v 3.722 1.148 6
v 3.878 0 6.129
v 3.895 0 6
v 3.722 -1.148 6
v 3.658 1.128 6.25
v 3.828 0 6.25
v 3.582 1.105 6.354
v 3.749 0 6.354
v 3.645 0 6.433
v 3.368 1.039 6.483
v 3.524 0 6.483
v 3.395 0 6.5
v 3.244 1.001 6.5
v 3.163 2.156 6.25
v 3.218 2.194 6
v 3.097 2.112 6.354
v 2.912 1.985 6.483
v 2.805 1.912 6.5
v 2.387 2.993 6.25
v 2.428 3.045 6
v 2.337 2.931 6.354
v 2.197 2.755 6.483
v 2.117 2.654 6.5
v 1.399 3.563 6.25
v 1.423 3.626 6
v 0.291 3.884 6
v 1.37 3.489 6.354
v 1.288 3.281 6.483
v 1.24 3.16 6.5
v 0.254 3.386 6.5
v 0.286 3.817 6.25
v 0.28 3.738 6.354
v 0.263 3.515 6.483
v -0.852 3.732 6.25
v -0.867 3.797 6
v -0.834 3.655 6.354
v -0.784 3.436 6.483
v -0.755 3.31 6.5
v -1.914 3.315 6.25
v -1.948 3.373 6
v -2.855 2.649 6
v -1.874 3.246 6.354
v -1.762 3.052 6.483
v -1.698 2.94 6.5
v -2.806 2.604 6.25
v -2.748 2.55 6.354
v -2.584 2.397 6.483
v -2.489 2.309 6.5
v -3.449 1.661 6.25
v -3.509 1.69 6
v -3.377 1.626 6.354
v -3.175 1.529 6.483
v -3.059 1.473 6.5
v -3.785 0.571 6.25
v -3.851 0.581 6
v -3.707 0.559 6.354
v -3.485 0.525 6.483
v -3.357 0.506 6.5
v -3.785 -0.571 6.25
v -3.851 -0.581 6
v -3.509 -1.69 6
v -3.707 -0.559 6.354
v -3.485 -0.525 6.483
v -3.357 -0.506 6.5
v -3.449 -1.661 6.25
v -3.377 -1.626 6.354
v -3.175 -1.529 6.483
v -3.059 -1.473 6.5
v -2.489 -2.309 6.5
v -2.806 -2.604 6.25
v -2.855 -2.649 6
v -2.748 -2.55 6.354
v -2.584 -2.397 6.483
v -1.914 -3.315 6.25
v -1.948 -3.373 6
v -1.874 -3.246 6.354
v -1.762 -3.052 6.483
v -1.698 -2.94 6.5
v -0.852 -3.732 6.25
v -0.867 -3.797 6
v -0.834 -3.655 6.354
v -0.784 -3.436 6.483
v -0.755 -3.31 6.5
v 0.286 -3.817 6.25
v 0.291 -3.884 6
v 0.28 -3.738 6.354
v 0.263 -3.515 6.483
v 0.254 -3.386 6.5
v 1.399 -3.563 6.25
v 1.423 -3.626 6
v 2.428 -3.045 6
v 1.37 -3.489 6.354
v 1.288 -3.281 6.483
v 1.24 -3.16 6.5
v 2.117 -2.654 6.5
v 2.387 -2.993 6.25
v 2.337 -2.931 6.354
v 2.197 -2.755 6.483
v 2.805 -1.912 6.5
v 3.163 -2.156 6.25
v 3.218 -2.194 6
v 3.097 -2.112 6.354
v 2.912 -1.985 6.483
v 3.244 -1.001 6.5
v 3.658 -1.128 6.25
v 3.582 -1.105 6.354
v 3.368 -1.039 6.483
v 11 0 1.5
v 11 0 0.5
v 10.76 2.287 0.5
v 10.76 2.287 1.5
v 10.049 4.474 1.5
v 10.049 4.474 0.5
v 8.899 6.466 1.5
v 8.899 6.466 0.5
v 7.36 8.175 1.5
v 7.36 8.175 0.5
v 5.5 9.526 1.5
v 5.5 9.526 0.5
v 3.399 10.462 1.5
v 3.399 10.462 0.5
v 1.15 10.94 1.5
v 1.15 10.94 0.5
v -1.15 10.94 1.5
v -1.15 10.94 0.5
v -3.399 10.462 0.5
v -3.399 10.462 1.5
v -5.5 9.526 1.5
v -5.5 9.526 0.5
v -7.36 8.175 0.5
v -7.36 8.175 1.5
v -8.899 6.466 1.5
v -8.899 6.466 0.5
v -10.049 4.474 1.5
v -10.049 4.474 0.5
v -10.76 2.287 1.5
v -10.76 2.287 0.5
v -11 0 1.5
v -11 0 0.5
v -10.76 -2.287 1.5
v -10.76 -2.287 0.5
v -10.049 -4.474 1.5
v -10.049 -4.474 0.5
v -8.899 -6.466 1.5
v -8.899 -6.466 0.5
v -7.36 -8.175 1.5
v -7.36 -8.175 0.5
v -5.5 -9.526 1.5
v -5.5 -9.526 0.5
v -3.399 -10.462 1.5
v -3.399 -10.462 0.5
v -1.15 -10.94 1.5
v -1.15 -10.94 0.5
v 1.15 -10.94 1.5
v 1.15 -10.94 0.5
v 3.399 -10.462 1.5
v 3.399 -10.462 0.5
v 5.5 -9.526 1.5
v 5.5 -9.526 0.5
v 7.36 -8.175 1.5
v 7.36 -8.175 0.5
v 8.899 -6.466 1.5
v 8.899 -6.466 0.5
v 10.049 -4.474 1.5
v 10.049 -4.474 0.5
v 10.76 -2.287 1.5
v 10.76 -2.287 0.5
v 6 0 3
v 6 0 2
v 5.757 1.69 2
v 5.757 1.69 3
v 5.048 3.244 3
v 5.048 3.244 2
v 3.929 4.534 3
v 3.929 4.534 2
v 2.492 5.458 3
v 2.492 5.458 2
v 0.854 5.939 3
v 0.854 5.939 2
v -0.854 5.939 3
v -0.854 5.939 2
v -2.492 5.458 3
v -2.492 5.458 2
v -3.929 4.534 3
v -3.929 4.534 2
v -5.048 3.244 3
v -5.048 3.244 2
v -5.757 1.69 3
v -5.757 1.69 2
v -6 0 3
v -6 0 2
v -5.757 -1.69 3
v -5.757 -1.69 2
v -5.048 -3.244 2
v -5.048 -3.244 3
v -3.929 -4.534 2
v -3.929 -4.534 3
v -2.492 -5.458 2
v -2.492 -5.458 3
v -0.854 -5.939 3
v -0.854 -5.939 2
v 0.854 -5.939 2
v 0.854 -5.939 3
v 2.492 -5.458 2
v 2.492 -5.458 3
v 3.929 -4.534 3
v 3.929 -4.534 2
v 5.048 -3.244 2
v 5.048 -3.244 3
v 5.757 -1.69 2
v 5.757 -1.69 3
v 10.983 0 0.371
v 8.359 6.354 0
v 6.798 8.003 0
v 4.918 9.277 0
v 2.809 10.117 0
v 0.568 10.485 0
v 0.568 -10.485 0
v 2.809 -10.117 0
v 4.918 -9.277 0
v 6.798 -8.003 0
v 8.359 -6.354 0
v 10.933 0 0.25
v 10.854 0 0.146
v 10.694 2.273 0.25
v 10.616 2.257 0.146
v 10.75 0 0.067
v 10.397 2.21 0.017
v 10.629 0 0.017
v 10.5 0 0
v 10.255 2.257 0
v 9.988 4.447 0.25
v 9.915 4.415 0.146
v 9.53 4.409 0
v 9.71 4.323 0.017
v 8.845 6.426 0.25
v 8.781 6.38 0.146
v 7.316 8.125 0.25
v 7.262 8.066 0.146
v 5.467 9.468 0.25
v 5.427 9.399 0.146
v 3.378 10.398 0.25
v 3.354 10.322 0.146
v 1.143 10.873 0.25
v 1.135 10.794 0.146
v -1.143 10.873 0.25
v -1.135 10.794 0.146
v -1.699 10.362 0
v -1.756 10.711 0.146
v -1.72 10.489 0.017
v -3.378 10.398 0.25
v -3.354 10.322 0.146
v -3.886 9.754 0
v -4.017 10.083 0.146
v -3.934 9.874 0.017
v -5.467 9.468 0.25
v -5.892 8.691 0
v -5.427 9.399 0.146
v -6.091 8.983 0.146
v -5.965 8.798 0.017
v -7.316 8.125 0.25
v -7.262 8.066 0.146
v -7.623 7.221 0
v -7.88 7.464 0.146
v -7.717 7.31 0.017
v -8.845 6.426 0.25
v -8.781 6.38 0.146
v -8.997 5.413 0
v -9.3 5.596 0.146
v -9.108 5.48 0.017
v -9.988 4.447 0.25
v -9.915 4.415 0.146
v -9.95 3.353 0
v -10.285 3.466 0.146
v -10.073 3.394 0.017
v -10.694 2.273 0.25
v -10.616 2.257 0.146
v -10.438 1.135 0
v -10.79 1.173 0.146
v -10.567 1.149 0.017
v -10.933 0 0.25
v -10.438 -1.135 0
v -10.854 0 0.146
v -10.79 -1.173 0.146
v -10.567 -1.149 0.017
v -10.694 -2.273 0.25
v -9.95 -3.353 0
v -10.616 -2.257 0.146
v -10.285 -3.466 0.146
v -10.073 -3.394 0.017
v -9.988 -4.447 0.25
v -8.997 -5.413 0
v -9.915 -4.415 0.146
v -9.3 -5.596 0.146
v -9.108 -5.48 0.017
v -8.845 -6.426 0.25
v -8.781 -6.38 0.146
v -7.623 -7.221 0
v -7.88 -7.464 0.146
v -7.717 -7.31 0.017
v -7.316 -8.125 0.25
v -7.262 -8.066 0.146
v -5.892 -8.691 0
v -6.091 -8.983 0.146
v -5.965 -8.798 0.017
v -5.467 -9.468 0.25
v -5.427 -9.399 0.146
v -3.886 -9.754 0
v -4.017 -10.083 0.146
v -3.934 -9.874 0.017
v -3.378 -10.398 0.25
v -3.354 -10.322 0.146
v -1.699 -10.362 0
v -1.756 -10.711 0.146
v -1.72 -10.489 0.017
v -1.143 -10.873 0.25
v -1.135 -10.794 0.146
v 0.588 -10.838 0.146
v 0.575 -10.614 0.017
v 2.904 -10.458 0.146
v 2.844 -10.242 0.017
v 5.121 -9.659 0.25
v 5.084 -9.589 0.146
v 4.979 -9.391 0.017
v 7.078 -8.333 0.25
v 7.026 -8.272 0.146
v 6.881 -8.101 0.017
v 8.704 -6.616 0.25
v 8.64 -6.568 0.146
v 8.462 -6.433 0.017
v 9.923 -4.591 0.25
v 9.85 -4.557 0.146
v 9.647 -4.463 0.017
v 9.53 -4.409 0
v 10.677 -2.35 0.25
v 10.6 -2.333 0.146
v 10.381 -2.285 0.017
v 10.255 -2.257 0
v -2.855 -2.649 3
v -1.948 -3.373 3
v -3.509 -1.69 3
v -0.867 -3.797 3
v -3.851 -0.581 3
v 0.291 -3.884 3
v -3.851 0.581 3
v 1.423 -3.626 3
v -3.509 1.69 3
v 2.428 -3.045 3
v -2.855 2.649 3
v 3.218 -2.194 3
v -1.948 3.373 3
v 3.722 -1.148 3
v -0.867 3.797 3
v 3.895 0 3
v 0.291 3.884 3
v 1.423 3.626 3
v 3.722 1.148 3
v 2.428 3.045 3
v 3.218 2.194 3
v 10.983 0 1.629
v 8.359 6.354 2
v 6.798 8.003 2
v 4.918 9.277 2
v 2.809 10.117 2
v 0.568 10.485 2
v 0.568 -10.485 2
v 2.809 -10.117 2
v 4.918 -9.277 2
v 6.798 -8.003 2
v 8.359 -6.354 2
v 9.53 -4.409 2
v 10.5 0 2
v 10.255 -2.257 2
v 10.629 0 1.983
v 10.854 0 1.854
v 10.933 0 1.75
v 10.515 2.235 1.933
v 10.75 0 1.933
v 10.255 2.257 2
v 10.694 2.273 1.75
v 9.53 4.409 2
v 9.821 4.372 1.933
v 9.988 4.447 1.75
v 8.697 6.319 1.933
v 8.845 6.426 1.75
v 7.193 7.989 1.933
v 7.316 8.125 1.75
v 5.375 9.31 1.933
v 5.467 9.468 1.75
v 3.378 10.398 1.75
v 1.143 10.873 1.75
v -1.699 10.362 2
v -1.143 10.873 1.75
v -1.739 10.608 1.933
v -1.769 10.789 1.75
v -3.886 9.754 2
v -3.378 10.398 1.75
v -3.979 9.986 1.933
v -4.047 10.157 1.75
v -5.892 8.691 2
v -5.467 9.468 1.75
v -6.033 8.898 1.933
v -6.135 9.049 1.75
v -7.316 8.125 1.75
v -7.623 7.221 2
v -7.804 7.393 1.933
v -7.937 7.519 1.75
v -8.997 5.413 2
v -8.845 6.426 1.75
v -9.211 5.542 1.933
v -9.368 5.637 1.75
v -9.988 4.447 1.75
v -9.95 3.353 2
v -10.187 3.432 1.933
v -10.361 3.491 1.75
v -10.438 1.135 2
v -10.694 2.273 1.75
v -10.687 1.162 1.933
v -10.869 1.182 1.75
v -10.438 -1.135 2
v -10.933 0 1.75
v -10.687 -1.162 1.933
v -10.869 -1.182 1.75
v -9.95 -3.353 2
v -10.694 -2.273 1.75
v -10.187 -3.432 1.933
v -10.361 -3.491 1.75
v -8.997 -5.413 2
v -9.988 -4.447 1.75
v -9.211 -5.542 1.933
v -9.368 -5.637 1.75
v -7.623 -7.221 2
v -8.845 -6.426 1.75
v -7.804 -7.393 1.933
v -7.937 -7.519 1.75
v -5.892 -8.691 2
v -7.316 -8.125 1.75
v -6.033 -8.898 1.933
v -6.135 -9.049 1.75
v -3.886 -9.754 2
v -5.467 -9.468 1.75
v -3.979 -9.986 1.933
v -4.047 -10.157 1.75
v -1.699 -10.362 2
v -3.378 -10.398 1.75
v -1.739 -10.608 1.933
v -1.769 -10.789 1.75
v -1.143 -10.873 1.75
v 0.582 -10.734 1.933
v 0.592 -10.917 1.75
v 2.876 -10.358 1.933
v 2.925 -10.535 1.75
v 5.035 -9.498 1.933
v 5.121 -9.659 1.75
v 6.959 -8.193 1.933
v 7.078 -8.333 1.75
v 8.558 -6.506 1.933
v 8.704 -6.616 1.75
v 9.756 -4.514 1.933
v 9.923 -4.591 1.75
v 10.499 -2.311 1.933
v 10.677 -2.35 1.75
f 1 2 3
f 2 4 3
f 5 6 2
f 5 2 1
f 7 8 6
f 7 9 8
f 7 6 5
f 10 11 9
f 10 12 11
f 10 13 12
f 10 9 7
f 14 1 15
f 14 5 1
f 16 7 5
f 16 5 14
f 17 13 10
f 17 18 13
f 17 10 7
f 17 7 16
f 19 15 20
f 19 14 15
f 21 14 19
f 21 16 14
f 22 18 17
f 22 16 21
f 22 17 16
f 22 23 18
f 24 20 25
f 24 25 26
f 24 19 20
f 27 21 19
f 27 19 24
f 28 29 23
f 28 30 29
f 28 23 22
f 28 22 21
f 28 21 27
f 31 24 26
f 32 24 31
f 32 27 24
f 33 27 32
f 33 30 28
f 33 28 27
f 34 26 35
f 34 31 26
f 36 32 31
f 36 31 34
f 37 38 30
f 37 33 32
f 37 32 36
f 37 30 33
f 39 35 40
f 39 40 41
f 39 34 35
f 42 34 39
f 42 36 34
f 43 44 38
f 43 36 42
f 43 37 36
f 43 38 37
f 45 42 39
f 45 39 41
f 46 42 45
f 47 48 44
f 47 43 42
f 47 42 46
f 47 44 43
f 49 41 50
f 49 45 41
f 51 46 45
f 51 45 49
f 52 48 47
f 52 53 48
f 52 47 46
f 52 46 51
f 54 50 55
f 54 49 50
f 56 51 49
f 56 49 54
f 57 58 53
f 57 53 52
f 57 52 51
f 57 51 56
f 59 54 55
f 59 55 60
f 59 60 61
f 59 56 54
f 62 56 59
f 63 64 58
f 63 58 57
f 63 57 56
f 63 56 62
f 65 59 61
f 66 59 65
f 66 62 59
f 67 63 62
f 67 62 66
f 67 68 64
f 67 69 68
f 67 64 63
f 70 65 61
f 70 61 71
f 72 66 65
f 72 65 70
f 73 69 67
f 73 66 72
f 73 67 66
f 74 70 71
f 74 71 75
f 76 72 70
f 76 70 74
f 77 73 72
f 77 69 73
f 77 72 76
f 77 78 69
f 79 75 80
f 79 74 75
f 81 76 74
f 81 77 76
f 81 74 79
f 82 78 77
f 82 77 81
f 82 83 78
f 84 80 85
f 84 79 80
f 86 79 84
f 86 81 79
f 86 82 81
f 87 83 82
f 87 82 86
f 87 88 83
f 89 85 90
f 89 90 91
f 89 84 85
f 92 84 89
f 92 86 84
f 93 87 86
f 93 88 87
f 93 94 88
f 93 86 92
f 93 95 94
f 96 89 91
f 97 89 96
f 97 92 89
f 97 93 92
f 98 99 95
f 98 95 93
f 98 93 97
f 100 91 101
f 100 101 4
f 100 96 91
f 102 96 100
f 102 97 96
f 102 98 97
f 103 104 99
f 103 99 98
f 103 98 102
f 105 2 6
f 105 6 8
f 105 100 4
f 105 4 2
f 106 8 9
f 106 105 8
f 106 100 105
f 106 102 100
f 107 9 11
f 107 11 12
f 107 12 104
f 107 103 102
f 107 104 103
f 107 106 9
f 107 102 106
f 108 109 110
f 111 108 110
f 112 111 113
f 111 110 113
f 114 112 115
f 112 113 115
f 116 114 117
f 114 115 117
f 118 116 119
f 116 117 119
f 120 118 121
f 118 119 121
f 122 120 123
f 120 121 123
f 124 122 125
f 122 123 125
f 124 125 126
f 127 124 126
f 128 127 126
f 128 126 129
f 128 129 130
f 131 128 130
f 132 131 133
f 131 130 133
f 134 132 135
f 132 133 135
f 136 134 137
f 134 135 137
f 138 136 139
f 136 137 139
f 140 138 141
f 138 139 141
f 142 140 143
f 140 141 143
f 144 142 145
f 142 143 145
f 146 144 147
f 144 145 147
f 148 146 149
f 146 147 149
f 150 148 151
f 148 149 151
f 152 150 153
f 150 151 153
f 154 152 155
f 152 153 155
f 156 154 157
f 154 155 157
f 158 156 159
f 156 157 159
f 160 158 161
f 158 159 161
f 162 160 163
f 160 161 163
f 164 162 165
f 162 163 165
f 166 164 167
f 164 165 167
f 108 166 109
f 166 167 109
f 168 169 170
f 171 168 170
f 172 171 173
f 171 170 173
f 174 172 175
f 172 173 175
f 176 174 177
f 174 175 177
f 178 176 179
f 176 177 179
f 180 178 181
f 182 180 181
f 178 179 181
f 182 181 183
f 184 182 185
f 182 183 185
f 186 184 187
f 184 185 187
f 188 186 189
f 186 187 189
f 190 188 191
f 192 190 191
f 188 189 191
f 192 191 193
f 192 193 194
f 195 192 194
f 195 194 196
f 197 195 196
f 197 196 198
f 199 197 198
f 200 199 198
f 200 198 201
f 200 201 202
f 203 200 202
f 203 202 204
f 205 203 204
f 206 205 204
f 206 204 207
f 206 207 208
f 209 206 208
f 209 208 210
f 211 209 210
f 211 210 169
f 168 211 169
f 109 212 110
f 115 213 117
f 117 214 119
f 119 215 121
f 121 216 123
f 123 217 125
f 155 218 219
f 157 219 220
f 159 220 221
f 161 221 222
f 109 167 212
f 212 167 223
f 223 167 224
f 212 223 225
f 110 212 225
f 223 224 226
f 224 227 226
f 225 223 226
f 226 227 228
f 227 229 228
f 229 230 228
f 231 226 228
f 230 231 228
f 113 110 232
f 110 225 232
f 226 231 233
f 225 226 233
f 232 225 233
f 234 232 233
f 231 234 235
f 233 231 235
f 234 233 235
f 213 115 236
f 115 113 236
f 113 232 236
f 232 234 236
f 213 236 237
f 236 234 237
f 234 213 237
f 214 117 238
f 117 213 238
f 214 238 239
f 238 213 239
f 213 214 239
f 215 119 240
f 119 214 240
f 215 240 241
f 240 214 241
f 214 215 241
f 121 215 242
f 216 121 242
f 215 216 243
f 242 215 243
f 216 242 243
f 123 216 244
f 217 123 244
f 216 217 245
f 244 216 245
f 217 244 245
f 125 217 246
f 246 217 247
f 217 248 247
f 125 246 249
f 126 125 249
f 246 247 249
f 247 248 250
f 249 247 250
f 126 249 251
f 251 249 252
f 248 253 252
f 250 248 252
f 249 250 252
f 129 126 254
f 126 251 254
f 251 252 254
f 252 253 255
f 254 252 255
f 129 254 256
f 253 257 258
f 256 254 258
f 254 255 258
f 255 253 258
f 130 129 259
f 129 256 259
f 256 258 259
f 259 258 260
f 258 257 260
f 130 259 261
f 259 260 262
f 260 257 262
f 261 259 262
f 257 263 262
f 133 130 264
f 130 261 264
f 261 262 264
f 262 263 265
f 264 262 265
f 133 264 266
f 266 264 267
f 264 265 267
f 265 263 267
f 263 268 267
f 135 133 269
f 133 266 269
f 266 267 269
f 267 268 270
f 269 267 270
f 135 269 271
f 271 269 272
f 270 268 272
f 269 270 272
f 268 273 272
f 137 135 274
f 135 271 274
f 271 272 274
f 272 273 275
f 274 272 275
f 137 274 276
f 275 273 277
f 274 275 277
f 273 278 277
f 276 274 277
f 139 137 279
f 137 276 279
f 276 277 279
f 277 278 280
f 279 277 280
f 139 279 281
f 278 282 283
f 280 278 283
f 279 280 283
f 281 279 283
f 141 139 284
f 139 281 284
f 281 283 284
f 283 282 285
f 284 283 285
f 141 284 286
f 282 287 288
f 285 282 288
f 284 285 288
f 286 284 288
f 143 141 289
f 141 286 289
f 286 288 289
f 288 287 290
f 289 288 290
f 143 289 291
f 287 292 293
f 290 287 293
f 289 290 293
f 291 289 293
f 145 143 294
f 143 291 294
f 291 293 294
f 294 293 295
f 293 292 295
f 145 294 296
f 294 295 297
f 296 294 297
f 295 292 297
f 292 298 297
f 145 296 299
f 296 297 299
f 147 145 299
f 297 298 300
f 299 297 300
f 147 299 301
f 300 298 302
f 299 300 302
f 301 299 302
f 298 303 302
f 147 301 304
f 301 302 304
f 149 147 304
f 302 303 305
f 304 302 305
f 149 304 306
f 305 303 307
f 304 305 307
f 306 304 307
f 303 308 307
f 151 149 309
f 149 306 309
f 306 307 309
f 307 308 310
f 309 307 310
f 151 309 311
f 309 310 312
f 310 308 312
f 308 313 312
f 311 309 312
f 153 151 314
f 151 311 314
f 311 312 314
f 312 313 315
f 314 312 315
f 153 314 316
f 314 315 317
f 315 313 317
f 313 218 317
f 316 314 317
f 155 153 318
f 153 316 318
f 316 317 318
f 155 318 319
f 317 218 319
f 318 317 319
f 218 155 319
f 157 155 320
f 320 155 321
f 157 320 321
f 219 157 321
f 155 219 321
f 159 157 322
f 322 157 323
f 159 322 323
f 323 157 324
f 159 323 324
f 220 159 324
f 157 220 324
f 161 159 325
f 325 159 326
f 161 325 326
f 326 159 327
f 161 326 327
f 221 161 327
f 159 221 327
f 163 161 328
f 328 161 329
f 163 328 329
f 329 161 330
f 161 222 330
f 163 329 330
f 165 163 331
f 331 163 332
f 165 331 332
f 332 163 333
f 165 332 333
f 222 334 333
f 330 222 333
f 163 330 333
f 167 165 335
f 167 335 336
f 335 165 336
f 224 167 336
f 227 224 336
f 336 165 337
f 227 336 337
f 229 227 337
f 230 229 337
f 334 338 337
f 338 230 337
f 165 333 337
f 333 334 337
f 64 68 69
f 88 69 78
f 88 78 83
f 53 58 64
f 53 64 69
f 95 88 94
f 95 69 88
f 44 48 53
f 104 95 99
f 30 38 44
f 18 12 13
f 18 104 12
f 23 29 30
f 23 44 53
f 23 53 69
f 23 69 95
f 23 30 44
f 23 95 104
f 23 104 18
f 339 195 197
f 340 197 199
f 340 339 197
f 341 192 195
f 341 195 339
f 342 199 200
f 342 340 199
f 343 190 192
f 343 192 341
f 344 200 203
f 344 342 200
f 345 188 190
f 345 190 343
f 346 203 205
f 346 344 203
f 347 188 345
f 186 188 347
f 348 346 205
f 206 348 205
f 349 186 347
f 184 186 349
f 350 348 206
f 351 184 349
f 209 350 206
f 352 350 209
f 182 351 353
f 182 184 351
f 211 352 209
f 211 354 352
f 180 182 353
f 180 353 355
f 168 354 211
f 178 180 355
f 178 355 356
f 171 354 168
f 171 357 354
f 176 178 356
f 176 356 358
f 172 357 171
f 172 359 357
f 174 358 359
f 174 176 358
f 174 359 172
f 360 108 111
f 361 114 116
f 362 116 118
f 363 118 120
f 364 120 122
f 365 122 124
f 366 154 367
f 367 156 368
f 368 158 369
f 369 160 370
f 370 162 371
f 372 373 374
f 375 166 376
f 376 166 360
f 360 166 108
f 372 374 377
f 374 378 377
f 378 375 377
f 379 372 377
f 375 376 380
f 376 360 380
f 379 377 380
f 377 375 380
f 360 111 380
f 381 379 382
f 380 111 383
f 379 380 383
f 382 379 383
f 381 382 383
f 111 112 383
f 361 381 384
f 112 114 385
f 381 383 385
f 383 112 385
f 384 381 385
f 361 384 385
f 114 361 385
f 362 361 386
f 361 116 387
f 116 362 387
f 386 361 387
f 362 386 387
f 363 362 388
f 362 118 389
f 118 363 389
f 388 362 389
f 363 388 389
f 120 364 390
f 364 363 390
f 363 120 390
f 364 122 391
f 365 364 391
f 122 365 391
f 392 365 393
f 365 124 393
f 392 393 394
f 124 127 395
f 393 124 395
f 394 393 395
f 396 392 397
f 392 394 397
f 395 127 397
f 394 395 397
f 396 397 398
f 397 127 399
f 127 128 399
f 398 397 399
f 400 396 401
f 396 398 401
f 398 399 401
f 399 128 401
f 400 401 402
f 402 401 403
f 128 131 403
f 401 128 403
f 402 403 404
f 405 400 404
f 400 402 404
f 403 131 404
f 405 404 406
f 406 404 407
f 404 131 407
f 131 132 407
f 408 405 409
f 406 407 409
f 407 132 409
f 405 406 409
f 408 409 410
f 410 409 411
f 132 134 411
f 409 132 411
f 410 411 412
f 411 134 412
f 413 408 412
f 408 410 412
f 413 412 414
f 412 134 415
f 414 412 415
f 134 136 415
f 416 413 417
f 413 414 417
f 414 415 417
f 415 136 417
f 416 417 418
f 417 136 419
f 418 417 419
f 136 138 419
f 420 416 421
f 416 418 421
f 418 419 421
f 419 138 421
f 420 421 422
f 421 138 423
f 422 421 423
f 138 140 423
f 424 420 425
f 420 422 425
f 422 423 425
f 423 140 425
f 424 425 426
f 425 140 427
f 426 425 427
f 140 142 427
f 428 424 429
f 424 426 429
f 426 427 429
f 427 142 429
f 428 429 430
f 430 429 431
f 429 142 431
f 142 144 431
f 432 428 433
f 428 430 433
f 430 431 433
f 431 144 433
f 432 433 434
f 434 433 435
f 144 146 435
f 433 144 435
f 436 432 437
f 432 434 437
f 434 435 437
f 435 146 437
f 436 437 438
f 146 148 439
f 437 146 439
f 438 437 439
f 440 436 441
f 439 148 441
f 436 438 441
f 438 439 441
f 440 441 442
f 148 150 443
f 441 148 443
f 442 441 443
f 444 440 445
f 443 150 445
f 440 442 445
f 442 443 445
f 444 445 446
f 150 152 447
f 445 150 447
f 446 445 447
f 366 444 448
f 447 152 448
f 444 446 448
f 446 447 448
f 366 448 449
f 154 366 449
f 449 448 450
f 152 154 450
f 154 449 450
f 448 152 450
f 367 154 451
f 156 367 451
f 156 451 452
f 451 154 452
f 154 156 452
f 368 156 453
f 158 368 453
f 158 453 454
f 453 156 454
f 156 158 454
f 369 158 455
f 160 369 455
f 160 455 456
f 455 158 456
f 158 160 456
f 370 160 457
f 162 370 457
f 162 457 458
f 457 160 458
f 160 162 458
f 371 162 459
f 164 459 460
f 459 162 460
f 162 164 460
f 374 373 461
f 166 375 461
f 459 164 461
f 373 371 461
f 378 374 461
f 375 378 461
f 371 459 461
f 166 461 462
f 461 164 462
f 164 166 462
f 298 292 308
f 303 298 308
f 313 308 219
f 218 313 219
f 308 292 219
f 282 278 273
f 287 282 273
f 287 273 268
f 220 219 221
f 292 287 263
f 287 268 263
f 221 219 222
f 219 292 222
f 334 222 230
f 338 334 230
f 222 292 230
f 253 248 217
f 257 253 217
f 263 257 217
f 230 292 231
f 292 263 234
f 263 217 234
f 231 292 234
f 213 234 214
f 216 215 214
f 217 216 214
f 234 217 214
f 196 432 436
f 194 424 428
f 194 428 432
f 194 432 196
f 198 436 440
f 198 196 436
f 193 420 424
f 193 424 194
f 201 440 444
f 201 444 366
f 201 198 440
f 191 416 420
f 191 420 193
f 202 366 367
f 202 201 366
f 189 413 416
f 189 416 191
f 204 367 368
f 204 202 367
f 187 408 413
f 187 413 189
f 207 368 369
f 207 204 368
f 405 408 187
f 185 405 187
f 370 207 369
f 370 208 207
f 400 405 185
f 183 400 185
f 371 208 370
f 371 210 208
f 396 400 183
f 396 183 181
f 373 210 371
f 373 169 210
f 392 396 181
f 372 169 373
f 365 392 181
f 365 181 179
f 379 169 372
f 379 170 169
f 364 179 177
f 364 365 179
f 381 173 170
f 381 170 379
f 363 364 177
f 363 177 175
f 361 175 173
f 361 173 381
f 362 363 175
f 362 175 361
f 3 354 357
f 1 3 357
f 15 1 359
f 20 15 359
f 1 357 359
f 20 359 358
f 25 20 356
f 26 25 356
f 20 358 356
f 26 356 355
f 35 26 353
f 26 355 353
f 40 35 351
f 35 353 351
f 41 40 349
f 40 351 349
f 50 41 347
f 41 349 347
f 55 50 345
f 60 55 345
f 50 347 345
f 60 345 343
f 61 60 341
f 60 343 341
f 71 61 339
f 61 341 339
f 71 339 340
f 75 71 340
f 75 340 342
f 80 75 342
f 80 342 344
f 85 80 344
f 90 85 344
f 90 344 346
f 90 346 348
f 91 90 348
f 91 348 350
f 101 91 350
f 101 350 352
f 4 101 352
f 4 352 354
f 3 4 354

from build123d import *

# Parameters (mm, degrees)
F0_R     = 11
F0_R_2   = 6
F1_DEPTH = 2
F0_R_3   = 3.895
F2_DEPTH = 3
F3_DEPTH = 6.5
F4_R     = 0.5
F5_R     = 0.5


with BuildPart() as f1:
    # F0 (on Top) → F1 (new body)
    with BuildSketch(Plane.XY):
        Circle(F0_R)
        Circle(F0_R_2, mode=Mode.SUBTRACT)
    extrude(amount=F1_DEPTH)

    # F0 (on Top) → F2 (join)
    with BuildSketch(Plane.XY):
        Circle(F0_R_2)
        Circle(F0_R_3, mode=Mode.SUBTRACT)
    extrude(amount=F2_DEPTH)

    # F0 (on Top) → F3 (join)
    with BuildSketch(Plane.XY):
        Circle(F0_R_3)
    extrude(amount=F3_DEPTH)

    # F4
    f4_edges = [f1.edges().sort_by_distance(p)[0] for p in [
        (-3.895, 0, 6.5),
    ]]
    fillet(f4_edges, radius=F4_R)

    # F5
    f5_edges = [f1.edges().sort_by_distance(p)[0] for p in [
        (-11, 0, 0),
        (-11, 0, 2),
    ]]
    fillet(f5_edges, radius=F5_R)


solid = f1.part
